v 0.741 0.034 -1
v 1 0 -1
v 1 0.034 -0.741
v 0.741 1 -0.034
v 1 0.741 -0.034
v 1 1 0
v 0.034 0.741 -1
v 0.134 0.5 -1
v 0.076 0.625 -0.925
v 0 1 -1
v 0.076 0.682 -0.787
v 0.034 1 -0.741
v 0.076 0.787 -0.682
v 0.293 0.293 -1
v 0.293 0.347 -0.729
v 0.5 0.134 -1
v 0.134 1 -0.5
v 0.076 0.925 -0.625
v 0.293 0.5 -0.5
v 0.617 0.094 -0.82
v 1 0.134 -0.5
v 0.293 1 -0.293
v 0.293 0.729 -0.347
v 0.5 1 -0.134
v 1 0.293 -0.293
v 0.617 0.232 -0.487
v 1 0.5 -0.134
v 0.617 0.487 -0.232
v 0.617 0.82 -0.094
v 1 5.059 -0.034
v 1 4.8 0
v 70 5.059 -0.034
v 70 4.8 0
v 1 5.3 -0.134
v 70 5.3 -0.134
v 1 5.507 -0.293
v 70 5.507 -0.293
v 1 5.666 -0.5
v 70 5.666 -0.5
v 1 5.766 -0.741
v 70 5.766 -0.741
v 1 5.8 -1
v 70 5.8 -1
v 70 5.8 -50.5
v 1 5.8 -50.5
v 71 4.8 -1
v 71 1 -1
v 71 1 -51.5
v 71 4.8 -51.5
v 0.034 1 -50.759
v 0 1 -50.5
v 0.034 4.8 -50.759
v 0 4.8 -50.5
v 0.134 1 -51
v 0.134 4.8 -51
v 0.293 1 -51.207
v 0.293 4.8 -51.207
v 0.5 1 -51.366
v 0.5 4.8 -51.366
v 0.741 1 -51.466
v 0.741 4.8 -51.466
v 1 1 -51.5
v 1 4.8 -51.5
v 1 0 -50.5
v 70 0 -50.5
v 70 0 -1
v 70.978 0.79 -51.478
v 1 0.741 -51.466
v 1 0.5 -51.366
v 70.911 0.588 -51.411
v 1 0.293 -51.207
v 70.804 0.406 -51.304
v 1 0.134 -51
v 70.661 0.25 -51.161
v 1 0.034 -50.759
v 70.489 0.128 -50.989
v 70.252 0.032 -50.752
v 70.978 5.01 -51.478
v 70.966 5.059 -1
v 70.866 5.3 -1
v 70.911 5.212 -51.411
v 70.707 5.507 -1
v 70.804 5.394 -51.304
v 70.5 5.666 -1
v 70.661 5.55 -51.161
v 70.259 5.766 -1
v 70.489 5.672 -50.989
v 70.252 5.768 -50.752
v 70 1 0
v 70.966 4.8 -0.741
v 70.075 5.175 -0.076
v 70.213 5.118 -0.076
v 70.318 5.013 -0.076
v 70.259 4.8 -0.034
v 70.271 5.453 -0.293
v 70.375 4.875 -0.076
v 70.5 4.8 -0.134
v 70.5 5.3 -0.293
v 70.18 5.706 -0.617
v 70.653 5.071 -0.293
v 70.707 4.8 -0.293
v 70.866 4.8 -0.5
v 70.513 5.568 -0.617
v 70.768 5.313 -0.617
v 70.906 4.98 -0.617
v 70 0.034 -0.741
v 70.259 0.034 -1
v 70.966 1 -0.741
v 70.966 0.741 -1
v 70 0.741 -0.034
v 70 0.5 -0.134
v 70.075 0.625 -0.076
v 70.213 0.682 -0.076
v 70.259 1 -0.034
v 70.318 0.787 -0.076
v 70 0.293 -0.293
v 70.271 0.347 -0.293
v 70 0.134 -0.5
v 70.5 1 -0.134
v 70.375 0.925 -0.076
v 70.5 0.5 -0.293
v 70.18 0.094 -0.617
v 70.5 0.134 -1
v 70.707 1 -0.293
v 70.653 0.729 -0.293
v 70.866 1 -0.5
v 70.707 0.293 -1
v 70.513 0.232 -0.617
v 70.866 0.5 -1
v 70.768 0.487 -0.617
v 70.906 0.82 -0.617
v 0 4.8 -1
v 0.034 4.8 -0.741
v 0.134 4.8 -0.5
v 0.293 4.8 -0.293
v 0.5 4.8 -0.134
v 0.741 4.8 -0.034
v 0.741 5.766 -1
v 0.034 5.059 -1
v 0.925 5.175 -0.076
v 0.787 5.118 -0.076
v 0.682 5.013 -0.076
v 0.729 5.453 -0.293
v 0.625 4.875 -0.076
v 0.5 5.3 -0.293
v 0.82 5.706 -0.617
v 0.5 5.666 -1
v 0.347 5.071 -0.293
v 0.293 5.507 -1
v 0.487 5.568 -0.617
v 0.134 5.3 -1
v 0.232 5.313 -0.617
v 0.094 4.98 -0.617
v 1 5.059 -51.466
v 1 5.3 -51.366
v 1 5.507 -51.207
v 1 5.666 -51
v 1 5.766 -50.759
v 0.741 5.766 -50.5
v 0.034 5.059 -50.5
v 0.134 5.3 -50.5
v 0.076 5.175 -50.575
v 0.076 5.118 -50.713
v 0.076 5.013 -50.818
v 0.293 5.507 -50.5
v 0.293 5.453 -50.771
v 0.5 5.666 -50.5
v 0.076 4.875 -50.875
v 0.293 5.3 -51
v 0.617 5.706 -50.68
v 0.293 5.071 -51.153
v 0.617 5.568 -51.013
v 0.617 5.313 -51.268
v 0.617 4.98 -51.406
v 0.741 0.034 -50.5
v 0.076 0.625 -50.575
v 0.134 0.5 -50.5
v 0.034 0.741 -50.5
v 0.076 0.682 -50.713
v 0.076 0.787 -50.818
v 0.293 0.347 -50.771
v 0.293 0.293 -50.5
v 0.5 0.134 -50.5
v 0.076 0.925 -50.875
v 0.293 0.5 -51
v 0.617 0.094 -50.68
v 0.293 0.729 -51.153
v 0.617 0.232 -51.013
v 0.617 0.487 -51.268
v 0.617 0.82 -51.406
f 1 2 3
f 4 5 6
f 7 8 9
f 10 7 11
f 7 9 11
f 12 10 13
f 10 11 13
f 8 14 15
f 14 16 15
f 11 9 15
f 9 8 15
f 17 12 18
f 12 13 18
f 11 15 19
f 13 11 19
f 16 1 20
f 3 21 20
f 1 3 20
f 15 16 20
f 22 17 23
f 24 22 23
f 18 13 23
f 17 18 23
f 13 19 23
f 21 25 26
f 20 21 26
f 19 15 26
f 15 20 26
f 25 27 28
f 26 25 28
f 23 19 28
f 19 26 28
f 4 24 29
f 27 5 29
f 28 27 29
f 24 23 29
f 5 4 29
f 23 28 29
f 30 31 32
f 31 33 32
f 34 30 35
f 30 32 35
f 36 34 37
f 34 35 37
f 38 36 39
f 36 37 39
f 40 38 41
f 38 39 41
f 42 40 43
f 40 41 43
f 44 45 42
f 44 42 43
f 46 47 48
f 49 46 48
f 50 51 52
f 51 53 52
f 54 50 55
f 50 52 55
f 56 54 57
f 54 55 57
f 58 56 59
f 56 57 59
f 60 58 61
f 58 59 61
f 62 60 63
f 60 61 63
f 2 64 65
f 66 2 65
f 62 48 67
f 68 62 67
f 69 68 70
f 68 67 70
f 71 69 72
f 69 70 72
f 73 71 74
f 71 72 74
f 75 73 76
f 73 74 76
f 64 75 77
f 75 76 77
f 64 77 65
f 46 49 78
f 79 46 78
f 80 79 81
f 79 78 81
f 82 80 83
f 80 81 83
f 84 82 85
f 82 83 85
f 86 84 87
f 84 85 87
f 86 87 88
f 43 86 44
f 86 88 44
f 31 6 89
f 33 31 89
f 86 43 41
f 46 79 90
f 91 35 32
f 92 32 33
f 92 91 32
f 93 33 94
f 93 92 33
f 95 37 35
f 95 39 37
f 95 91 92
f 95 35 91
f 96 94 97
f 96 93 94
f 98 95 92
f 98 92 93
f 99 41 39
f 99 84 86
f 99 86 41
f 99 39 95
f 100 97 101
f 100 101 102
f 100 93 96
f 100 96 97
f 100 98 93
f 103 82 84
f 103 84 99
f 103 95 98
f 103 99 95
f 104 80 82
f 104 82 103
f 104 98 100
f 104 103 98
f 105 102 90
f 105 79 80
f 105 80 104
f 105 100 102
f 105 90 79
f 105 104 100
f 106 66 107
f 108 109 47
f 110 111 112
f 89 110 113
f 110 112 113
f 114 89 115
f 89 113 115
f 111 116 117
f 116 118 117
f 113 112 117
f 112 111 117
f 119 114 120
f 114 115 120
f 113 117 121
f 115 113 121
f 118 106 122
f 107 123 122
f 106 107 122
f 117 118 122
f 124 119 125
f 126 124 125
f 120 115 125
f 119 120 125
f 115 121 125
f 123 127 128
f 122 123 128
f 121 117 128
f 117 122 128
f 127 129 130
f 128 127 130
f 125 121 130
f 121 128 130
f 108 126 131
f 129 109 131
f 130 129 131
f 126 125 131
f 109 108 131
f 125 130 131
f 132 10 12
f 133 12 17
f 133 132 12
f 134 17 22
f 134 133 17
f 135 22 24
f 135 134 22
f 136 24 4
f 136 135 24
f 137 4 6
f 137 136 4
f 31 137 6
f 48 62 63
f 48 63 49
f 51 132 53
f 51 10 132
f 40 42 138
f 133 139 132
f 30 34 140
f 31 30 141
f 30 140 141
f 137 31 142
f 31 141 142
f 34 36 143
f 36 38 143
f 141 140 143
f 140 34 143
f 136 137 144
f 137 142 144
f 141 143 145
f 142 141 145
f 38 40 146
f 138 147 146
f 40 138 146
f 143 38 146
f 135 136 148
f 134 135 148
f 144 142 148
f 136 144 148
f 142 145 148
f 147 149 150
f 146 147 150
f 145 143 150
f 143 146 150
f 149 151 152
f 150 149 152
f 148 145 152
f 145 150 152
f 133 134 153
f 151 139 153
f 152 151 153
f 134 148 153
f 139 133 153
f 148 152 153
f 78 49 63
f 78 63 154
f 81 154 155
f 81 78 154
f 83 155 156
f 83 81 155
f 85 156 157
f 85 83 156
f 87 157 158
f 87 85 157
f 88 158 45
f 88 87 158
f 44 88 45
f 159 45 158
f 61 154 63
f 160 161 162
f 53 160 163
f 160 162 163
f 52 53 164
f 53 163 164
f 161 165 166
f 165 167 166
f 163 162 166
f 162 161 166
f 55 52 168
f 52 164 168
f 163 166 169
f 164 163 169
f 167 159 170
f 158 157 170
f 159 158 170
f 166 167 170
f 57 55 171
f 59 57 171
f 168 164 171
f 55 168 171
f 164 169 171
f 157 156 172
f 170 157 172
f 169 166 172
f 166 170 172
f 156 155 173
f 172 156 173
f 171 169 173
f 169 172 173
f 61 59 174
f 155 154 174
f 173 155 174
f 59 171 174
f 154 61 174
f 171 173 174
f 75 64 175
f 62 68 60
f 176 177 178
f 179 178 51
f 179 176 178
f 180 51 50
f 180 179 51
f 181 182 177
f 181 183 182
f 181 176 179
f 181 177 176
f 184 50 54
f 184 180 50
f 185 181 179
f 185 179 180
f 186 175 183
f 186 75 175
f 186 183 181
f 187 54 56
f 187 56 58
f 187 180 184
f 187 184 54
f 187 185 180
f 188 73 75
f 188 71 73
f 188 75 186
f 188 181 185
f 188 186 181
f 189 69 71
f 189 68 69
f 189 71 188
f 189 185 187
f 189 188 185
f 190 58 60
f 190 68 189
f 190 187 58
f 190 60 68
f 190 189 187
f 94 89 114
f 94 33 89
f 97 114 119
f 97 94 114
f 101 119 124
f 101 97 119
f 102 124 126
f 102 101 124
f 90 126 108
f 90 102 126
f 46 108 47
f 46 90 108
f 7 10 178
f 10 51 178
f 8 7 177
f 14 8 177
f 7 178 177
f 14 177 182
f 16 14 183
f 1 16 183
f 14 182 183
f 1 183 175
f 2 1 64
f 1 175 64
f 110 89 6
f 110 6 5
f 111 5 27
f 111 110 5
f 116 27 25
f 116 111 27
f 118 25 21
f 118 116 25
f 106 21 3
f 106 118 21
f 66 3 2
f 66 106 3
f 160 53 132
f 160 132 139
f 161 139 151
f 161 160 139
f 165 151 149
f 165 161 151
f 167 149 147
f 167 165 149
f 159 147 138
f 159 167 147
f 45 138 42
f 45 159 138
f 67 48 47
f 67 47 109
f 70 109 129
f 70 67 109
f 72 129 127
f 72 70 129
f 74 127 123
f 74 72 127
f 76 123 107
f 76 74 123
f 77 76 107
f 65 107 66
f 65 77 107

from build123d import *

# Parameters (mm, degrees)
SKETCH1_W           = 71
SKETCH1_H           = 51.5
BOSS_EXTRUDE1_DEPTH = 5.8
FILLET1_R           = 1


with BuildPart() as part:
    # Sketch1 → Boss-Extrude1 (new body)
    with BuildSketch(Plane(origin=(0, 0, 0), x_dir=(1, 0, 0), z_dir=(0, 1, 0))):
        with Locations((35.5, 25.75)):
            Rectangle(SKETCH1_W, SKETCH1_H)
    extrude(amount=BOSS_EXTRUDE1_DEPTH)

    # Fillet1
    fillet1_edges = [part.edges().sort_by_distance(p)[0] for p in [
        (71, 5.8, -25.75),
        (35.5, 5.8, -51.5),
        (0, 5.8, -25.75),
        (35.5, 0, -51.5),
        (71, 0, -25.75),
        (35.5, 0, 0),
        (0, 0, -25.75),
        (35.5, 5.8, 0),
        (0, 2.9, -51.5),
        (71, 2.9, 0),
        (0, 2.9, 0),
    ]]
    fillet(fillet1_edges, radius=FILLET1_R)


solid = part.part
